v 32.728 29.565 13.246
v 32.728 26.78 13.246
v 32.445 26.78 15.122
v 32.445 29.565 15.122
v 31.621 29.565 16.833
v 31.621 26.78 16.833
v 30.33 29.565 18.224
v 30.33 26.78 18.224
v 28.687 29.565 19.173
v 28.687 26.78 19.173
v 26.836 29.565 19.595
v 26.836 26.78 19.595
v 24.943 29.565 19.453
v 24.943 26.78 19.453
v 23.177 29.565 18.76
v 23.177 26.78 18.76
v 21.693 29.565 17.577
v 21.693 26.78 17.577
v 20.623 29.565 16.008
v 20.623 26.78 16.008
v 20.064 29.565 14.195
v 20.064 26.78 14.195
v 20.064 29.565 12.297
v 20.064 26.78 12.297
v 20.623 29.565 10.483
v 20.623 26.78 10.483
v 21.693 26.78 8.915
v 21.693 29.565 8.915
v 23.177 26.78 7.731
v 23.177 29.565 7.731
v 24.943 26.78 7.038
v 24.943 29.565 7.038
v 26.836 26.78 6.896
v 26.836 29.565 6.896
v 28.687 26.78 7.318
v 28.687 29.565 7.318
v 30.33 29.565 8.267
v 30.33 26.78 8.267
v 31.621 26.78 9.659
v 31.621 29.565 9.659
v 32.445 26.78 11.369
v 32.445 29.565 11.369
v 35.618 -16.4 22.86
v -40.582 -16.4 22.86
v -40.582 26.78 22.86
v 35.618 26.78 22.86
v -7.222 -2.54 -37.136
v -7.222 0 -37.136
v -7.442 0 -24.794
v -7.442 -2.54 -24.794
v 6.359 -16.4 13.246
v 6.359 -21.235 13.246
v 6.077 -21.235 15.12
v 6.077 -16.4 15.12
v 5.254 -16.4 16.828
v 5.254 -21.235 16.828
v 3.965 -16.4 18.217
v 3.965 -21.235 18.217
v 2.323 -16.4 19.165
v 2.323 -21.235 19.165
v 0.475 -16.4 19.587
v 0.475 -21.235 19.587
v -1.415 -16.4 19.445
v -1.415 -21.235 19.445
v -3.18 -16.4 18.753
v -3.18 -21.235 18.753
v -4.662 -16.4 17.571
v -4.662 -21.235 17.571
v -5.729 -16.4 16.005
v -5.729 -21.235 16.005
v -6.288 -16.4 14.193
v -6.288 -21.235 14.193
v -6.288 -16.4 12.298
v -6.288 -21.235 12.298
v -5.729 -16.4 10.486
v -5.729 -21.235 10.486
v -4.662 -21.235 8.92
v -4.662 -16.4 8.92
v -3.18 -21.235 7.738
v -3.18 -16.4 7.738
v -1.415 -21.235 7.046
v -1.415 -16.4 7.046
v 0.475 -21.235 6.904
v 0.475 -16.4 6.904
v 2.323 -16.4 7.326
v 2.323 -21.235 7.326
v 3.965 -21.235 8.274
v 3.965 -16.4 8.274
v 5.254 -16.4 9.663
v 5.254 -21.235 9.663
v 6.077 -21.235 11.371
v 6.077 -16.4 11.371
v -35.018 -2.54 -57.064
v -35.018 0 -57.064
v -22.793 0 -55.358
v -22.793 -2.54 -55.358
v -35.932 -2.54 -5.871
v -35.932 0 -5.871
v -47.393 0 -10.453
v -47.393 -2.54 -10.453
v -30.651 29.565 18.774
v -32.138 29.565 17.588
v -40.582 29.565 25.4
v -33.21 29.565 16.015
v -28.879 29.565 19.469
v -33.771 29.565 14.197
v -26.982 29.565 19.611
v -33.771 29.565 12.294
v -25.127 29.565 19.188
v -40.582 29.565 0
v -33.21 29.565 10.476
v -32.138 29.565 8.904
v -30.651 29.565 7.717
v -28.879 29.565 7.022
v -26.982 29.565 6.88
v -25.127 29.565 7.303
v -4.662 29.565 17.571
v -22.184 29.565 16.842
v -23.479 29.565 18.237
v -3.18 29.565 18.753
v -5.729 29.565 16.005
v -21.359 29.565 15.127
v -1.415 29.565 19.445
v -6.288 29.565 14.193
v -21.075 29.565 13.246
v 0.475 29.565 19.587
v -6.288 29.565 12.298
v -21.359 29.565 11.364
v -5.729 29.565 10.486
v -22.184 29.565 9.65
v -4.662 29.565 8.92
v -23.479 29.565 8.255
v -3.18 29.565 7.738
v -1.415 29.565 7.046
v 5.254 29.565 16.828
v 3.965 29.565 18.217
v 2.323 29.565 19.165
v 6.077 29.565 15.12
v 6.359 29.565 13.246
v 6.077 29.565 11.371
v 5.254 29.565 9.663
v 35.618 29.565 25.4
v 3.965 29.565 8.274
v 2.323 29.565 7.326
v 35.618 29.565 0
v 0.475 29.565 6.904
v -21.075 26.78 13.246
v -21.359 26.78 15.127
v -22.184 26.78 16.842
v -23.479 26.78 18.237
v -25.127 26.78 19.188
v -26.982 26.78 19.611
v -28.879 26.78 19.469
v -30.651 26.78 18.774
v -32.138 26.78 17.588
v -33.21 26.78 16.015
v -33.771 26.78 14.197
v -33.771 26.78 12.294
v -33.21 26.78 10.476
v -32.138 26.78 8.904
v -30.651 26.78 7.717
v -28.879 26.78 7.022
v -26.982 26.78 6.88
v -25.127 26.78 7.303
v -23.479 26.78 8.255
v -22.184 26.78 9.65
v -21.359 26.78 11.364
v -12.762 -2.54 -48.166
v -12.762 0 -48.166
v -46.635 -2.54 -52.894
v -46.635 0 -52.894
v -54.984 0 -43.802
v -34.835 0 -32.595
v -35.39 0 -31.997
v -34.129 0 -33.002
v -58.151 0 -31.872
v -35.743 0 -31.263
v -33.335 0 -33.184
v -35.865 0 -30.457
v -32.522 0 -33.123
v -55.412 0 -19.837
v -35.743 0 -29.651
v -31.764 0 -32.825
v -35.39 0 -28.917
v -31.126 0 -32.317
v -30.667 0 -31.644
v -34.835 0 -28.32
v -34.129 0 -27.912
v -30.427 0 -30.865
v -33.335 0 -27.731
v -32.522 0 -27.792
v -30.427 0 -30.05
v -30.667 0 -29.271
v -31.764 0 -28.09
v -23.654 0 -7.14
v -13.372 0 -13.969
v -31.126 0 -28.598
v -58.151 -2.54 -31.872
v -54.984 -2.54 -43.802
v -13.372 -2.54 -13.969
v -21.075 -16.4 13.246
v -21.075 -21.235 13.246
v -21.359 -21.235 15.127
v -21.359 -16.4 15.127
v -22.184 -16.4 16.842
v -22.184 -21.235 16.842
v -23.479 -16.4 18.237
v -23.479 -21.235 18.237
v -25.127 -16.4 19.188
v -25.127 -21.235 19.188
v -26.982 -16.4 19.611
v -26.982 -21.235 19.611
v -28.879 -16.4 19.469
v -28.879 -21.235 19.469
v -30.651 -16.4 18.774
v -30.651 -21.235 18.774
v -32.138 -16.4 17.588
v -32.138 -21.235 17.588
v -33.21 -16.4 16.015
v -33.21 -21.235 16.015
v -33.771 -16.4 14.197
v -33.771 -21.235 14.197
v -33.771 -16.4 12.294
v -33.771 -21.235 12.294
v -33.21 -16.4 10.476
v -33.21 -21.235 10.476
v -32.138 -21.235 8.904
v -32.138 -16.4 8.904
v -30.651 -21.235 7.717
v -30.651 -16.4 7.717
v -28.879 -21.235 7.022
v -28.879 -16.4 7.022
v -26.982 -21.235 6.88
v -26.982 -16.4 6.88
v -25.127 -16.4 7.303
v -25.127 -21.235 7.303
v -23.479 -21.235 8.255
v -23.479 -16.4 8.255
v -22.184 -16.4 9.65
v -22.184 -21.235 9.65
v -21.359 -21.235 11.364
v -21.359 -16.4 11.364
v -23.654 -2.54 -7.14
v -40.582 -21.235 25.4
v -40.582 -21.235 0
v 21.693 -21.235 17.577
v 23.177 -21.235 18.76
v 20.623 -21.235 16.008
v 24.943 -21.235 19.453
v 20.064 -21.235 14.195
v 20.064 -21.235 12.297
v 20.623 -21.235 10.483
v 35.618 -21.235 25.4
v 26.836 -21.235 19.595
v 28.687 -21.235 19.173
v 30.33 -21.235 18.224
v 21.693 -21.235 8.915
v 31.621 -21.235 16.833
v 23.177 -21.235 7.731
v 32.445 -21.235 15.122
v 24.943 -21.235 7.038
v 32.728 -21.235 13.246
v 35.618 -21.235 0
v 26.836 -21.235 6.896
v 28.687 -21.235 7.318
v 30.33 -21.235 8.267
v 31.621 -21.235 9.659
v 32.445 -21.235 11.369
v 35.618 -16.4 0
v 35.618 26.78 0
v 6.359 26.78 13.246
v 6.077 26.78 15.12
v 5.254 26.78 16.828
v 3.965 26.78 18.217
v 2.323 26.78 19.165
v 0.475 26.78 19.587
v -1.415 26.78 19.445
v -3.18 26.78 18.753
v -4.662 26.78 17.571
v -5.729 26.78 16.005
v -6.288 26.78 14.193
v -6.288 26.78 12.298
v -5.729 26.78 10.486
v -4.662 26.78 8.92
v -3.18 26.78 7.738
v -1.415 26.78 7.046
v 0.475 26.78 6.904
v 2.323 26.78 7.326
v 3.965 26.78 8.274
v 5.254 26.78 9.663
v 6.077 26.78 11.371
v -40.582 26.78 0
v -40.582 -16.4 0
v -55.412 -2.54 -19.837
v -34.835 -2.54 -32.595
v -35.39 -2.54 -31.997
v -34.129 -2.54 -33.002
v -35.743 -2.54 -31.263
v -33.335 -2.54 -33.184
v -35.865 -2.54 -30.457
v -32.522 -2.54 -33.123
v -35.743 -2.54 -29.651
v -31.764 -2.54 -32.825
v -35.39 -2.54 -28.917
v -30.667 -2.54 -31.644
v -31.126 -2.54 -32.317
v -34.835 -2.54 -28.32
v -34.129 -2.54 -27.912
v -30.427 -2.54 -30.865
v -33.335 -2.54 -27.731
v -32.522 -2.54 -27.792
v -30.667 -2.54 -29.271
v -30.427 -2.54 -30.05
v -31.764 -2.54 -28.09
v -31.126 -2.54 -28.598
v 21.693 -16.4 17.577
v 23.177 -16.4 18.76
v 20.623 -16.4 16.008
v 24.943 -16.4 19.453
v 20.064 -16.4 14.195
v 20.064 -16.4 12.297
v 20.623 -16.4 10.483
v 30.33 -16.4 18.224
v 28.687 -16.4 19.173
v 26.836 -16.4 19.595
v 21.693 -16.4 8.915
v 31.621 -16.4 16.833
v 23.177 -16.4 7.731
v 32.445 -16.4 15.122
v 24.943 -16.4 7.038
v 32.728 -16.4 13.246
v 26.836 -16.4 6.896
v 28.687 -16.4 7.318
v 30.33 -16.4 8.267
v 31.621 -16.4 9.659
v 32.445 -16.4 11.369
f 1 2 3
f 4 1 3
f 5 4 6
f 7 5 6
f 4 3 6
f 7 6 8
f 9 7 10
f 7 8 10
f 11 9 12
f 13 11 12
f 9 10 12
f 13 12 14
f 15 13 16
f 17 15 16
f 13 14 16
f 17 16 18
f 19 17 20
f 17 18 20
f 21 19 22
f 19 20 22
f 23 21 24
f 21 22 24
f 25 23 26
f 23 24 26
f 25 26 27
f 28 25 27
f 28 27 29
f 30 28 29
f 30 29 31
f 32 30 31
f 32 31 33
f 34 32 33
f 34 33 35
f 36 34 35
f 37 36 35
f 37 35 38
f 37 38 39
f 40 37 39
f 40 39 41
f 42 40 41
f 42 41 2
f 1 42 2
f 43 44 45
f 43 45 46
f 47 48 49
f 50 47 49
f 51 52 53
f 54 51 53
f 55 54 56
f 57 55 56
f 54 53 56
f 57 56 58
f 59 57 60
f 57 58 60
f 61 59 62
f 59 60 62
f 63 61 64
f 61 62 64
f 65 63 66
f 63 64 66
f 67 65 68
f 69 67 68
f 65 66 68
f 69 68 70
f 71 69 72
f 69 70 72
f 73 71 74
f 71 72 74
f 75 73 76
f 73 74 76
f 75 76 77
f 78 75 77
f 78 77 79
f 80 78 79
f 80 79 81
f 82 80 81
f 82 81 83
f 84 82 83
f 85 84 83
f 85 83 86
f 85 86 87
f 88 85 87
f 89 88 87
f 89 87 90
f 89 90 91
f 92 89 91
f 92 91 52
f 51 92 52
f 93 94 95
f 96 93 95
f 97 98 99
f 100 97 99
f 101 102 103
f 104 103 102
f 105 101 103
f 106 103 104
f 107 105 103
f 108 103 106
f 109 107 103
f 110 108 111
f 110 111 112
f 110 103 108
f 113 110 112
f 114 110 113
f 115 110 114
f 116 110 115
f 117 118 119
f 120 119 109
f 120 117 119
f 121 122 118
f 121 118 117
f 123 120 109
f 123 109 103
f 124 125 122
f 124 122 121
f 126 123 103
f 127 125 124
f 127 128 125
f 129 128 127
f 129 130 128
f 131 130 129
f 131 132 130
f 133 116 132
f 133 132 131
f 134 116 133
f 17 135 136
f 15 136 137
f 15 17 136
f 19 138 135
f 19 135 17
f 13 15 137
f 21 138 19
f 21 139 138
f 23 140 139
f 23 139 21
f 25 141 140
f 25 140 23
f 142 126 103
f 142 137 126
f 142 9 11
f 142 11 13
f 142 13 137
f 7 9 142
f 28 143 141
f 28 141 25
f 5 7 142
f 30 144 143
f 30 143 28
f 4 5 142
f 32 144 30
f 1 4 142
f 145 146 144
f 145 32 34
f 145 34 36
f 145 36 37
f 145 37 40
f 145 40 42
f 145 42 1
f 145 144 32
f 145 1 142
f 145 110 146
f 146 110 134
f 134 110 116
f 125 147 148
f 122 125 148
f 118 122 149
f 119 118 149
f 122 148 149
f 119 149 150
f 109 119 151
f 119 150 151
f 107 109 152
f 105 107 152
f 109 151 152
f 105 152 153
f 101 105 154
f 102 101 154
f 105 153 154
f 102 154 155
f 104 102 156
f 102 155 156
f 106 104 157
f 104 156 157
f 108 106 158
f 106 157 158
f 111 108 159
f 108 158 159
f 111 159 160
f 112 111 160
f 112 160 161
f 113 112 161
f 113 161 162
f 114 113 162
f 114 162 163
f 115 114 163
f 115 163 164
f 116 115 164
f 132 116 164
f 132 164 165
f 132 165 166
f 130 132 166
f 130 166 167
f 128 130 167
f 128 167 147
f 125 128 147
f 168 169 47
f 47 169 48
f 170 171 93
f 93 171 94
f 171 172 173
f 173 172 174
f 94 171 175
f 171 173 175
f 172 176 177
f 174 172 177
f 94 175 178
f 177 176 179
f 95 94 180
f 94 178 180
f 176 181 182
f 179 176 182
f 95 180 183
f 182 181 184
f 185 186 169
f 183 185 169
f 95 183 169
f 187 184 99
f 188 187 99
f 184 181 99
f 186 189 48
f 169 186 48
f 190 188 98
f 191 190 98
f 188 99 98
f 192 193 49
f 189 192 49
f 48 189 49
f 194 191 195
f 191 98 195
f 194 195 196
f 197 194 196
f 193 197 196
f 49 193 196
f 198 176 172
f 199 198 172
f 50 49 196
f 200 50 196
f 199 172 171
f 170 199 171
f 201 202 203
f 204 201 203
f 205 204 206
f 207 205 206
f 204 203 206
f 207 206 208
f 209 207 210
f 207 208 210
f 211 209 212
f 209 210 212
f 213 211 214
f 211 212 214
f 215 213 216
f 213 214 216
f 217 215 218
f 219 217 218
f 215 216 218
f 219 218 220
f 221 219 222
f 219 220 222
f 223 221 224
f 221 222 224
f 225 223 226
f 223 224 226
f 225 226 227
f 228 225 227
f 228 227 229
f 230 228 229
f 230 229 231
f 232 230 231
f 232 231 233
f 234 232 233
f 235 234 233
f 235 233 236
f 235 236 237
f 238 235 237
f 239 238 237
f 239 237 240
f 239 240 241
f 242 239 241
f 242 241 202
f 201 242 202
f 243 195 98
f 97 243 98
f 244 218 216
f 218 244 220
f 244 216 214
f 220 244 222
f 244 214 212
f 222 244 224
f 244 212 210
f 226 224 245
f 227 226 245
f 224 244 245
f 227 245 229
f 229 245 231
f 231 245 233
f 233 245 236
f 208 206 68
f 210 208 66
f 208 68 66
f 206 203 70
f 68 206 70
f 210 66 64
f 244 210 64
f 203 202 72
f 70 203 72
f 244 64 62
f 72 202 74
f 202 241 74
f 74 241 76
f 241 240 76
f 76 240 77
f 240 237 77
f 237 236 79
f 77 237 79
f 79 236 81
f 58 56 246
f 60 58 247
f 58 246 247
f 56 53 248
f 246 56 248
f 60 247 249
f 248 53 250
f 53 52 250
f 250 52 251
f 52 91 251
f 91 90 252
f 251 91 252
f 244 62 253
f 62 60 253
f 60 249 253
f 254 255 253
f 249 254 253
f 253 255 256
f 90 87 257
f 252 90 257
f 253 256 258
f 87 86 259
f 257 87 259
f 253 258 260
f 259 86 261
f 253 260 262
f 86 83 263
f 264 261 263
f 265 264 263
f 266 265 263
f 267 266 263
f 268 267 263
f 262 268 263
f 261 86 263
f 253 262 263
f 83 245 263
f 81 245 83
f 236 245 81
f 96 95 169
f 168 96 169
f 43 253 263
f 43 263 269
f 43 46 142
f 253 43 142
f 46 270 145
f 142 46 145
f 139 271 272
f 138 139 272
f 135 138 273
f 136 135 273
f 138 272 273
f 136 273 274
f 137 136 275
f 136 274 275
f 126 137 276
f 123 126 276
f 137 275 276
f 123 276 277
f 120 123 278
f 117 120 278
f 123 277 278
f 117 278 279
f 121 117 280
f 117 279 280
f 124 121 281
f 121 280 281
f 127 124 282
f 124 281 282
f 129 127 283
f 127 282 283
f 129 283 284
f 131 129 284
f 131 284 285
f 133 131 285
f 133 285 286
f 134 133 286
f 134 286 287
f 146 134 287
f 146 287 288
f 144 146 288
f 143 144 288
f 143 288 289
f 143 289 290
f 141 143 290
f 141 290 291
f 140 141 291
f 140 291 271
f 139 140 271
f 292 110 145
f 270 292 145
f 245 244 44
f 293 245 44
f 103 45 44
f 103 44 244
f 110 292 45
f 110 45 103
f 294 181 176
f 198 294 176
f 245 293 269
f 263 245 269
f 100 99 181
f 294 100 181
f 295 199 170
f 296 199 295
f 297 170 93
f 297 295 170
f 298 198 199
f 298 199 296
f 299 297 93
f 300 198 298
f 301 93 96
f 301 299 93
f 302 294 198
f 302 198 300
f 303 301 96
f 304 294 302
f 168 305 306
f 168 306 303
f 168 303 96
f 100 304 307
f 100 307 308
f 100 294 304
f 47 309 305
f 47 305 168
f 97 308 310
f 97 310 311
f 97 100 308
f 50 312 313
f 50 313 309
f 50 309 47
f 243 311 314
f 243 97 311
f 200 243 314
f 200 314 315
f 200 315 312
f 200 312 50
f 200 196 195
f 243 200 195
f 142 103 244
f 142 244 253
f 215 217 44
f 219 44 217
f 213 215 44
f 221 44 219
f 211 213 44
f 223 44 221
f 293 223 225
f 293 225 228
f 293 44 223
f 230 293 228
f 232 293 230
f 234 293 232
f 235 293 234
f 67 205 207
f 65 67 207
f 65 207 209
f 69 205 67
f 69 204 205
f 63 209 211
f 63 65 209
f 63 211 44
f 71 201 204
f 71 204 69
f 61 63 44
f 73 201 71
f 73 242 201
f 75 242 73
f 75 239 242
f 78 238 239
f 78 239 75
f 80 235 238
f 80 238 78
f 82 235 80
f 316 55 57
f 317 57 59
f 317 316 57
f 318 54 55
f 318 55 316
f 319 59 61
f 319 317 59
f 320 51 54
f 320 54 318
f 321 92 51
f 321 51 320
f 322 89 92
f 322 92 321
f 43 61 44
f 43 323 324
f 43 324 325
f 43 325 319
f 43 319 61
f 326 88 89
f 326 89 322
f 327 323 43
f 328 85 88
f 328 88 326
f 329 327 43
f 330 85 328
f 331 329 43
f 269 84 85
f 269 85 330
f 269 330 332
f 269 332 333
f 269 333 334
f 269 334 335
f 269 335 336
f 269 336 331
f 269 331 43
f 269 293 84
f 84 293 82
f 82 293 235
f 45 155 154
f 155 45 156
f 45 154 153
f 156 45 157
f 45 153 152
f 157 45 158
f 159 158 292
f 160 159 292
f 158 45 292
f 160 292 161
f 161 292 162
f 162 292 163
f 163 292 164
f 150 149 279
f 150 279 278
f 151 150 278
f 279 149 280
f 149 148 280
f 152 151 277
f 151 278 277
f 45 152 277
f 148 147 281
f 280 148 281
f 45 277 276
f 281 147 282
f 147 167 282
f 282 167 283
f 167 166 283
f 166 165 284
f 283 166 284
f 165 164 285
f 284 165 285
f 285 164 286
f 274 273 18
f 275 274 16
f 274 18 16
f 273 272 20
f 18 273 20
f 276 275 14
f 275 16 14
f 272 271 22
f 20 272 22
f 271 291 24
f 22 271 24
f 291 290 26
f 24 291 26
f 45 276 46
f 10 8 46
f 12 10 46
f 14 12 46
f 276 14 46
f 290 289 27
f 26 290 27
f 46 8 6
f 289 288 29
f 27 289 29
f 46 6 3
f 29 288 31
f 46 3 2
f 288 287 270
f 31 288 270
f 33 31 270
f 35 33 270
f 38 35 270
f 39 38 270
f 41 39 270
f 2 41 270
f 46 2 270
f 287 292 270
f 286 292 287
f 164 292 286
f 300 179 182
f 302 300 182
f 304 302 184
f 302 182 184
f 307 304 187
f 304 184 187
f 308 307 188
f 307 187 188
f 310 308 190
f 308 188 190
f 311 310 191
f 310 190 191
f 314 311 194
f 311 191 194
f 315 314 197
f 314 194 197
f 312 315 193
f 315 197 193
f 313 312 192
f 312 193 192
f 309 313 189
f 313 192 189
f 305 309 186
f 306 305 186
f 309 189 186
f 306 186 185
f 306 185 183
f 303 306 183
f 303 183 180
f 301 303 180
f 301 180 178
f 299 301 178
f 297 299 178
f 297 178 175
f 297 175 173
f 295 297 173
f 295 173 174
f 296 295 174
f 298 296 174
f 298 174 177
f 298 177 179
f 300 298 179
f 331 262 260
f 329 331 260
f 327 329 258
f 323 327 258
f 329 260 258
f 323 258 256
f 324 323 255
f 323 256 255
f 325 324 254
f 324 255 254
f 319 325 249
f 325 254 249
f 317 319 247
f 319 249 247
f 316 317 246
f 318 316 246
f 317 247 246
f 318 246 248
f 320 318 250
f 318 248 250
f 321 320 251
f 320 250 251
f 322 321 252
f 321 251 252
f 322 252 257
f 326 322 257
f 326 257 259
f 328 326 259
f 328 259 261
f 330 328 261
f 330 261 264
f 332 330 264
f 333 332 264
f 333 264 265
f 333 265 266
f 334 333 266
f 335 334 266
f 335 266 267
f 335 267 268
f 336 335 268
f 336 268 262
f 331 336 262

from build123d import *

# Parameters (mm, degrees)
F0_W     = 76.2
F0_H     = 50.8
F1_DEPTH = 25.4
F2_W     = 76.2
F2_H     = 43.18
F3_DEPTH = 22.86
F4_R     = 6.383663
F4_R_2   = 6.35908
F4_R_3   = 6.367487
F5_DEPTH = 78.74
F7_DEPTH = 2.54
F8_R     = 2.734054
F9_DEPTH = 25.4


with BuildPart() as f1:
    # F0 (on Top) → F1 (new body)
    with BuildSketch(Plane.XY):
        with Locations((-2.482411, 4.165309)):
            Rectangle(F0_W, F0_H)
    extrude(amount=F1_DEPTH)

    # F2 (on face) → F3 (cut)
    with BuildSketch(Plane(origin=(0, 0, 0), x_dir=(1, 0, 0), z_dir=(0, 0, -1))):
        with Locations((-2.482411, -5.189879)):
            Rectangle(F2_W, F2_H)
    extrude(amount=-F3_DEPTH, mode=Mode.SUBTRACT)

    # F4 (on face) → F5 (cut)
    with BuildSketch(Plane.XZ.offset(21.234691)):
        with Locations((-27.458796, 13.245586)):
            Circle(F4_R)
        with Locations((0, 13.245586)):
            Circle(F4_R_2)
        with Locations((26.360262, 13.245586)):
            Circle(F4_R_3)
    extrude(amount=-F5_DEPTH, mode=Mode.SUBTRACT)


with BuildPart() as f7:
    # F6 (on Front) → F7 (new body)
    with BuildSketch(Plane.XZ):
        Polygon((-7.441864, -24.794499), (-13.372193, -13.969296), (-23.653961, -7.140016), (-35.931739, -5.871165), (-47.392837, -10.453421), (-55.411653, -19.837045), (-58.151176, -31.872361), (-54.983812, -43.802224), (-46.635167, -52.893646), (-35.017815, -57.063891), (-22.793151, -55.357607), (-12.761698, -48.165682), (-7.221541, -37.135701), align=None)
    extrude(amount=F7_DEPTH)

    # F8 (on face) → F9 (cut)
    with BuildSketch(Plane(origin=(0, 0, 0), x_dir=(-1, 0, 0), z_dir=(0, 1, 0))):
        with Locations((33.130631, -30.457268)):
            Circle(F8_R)
    extrude(amount=-F9_DEPTH, mode=Mode.SUBTRACT)


solid = Compound([f1.part, f7.part])
